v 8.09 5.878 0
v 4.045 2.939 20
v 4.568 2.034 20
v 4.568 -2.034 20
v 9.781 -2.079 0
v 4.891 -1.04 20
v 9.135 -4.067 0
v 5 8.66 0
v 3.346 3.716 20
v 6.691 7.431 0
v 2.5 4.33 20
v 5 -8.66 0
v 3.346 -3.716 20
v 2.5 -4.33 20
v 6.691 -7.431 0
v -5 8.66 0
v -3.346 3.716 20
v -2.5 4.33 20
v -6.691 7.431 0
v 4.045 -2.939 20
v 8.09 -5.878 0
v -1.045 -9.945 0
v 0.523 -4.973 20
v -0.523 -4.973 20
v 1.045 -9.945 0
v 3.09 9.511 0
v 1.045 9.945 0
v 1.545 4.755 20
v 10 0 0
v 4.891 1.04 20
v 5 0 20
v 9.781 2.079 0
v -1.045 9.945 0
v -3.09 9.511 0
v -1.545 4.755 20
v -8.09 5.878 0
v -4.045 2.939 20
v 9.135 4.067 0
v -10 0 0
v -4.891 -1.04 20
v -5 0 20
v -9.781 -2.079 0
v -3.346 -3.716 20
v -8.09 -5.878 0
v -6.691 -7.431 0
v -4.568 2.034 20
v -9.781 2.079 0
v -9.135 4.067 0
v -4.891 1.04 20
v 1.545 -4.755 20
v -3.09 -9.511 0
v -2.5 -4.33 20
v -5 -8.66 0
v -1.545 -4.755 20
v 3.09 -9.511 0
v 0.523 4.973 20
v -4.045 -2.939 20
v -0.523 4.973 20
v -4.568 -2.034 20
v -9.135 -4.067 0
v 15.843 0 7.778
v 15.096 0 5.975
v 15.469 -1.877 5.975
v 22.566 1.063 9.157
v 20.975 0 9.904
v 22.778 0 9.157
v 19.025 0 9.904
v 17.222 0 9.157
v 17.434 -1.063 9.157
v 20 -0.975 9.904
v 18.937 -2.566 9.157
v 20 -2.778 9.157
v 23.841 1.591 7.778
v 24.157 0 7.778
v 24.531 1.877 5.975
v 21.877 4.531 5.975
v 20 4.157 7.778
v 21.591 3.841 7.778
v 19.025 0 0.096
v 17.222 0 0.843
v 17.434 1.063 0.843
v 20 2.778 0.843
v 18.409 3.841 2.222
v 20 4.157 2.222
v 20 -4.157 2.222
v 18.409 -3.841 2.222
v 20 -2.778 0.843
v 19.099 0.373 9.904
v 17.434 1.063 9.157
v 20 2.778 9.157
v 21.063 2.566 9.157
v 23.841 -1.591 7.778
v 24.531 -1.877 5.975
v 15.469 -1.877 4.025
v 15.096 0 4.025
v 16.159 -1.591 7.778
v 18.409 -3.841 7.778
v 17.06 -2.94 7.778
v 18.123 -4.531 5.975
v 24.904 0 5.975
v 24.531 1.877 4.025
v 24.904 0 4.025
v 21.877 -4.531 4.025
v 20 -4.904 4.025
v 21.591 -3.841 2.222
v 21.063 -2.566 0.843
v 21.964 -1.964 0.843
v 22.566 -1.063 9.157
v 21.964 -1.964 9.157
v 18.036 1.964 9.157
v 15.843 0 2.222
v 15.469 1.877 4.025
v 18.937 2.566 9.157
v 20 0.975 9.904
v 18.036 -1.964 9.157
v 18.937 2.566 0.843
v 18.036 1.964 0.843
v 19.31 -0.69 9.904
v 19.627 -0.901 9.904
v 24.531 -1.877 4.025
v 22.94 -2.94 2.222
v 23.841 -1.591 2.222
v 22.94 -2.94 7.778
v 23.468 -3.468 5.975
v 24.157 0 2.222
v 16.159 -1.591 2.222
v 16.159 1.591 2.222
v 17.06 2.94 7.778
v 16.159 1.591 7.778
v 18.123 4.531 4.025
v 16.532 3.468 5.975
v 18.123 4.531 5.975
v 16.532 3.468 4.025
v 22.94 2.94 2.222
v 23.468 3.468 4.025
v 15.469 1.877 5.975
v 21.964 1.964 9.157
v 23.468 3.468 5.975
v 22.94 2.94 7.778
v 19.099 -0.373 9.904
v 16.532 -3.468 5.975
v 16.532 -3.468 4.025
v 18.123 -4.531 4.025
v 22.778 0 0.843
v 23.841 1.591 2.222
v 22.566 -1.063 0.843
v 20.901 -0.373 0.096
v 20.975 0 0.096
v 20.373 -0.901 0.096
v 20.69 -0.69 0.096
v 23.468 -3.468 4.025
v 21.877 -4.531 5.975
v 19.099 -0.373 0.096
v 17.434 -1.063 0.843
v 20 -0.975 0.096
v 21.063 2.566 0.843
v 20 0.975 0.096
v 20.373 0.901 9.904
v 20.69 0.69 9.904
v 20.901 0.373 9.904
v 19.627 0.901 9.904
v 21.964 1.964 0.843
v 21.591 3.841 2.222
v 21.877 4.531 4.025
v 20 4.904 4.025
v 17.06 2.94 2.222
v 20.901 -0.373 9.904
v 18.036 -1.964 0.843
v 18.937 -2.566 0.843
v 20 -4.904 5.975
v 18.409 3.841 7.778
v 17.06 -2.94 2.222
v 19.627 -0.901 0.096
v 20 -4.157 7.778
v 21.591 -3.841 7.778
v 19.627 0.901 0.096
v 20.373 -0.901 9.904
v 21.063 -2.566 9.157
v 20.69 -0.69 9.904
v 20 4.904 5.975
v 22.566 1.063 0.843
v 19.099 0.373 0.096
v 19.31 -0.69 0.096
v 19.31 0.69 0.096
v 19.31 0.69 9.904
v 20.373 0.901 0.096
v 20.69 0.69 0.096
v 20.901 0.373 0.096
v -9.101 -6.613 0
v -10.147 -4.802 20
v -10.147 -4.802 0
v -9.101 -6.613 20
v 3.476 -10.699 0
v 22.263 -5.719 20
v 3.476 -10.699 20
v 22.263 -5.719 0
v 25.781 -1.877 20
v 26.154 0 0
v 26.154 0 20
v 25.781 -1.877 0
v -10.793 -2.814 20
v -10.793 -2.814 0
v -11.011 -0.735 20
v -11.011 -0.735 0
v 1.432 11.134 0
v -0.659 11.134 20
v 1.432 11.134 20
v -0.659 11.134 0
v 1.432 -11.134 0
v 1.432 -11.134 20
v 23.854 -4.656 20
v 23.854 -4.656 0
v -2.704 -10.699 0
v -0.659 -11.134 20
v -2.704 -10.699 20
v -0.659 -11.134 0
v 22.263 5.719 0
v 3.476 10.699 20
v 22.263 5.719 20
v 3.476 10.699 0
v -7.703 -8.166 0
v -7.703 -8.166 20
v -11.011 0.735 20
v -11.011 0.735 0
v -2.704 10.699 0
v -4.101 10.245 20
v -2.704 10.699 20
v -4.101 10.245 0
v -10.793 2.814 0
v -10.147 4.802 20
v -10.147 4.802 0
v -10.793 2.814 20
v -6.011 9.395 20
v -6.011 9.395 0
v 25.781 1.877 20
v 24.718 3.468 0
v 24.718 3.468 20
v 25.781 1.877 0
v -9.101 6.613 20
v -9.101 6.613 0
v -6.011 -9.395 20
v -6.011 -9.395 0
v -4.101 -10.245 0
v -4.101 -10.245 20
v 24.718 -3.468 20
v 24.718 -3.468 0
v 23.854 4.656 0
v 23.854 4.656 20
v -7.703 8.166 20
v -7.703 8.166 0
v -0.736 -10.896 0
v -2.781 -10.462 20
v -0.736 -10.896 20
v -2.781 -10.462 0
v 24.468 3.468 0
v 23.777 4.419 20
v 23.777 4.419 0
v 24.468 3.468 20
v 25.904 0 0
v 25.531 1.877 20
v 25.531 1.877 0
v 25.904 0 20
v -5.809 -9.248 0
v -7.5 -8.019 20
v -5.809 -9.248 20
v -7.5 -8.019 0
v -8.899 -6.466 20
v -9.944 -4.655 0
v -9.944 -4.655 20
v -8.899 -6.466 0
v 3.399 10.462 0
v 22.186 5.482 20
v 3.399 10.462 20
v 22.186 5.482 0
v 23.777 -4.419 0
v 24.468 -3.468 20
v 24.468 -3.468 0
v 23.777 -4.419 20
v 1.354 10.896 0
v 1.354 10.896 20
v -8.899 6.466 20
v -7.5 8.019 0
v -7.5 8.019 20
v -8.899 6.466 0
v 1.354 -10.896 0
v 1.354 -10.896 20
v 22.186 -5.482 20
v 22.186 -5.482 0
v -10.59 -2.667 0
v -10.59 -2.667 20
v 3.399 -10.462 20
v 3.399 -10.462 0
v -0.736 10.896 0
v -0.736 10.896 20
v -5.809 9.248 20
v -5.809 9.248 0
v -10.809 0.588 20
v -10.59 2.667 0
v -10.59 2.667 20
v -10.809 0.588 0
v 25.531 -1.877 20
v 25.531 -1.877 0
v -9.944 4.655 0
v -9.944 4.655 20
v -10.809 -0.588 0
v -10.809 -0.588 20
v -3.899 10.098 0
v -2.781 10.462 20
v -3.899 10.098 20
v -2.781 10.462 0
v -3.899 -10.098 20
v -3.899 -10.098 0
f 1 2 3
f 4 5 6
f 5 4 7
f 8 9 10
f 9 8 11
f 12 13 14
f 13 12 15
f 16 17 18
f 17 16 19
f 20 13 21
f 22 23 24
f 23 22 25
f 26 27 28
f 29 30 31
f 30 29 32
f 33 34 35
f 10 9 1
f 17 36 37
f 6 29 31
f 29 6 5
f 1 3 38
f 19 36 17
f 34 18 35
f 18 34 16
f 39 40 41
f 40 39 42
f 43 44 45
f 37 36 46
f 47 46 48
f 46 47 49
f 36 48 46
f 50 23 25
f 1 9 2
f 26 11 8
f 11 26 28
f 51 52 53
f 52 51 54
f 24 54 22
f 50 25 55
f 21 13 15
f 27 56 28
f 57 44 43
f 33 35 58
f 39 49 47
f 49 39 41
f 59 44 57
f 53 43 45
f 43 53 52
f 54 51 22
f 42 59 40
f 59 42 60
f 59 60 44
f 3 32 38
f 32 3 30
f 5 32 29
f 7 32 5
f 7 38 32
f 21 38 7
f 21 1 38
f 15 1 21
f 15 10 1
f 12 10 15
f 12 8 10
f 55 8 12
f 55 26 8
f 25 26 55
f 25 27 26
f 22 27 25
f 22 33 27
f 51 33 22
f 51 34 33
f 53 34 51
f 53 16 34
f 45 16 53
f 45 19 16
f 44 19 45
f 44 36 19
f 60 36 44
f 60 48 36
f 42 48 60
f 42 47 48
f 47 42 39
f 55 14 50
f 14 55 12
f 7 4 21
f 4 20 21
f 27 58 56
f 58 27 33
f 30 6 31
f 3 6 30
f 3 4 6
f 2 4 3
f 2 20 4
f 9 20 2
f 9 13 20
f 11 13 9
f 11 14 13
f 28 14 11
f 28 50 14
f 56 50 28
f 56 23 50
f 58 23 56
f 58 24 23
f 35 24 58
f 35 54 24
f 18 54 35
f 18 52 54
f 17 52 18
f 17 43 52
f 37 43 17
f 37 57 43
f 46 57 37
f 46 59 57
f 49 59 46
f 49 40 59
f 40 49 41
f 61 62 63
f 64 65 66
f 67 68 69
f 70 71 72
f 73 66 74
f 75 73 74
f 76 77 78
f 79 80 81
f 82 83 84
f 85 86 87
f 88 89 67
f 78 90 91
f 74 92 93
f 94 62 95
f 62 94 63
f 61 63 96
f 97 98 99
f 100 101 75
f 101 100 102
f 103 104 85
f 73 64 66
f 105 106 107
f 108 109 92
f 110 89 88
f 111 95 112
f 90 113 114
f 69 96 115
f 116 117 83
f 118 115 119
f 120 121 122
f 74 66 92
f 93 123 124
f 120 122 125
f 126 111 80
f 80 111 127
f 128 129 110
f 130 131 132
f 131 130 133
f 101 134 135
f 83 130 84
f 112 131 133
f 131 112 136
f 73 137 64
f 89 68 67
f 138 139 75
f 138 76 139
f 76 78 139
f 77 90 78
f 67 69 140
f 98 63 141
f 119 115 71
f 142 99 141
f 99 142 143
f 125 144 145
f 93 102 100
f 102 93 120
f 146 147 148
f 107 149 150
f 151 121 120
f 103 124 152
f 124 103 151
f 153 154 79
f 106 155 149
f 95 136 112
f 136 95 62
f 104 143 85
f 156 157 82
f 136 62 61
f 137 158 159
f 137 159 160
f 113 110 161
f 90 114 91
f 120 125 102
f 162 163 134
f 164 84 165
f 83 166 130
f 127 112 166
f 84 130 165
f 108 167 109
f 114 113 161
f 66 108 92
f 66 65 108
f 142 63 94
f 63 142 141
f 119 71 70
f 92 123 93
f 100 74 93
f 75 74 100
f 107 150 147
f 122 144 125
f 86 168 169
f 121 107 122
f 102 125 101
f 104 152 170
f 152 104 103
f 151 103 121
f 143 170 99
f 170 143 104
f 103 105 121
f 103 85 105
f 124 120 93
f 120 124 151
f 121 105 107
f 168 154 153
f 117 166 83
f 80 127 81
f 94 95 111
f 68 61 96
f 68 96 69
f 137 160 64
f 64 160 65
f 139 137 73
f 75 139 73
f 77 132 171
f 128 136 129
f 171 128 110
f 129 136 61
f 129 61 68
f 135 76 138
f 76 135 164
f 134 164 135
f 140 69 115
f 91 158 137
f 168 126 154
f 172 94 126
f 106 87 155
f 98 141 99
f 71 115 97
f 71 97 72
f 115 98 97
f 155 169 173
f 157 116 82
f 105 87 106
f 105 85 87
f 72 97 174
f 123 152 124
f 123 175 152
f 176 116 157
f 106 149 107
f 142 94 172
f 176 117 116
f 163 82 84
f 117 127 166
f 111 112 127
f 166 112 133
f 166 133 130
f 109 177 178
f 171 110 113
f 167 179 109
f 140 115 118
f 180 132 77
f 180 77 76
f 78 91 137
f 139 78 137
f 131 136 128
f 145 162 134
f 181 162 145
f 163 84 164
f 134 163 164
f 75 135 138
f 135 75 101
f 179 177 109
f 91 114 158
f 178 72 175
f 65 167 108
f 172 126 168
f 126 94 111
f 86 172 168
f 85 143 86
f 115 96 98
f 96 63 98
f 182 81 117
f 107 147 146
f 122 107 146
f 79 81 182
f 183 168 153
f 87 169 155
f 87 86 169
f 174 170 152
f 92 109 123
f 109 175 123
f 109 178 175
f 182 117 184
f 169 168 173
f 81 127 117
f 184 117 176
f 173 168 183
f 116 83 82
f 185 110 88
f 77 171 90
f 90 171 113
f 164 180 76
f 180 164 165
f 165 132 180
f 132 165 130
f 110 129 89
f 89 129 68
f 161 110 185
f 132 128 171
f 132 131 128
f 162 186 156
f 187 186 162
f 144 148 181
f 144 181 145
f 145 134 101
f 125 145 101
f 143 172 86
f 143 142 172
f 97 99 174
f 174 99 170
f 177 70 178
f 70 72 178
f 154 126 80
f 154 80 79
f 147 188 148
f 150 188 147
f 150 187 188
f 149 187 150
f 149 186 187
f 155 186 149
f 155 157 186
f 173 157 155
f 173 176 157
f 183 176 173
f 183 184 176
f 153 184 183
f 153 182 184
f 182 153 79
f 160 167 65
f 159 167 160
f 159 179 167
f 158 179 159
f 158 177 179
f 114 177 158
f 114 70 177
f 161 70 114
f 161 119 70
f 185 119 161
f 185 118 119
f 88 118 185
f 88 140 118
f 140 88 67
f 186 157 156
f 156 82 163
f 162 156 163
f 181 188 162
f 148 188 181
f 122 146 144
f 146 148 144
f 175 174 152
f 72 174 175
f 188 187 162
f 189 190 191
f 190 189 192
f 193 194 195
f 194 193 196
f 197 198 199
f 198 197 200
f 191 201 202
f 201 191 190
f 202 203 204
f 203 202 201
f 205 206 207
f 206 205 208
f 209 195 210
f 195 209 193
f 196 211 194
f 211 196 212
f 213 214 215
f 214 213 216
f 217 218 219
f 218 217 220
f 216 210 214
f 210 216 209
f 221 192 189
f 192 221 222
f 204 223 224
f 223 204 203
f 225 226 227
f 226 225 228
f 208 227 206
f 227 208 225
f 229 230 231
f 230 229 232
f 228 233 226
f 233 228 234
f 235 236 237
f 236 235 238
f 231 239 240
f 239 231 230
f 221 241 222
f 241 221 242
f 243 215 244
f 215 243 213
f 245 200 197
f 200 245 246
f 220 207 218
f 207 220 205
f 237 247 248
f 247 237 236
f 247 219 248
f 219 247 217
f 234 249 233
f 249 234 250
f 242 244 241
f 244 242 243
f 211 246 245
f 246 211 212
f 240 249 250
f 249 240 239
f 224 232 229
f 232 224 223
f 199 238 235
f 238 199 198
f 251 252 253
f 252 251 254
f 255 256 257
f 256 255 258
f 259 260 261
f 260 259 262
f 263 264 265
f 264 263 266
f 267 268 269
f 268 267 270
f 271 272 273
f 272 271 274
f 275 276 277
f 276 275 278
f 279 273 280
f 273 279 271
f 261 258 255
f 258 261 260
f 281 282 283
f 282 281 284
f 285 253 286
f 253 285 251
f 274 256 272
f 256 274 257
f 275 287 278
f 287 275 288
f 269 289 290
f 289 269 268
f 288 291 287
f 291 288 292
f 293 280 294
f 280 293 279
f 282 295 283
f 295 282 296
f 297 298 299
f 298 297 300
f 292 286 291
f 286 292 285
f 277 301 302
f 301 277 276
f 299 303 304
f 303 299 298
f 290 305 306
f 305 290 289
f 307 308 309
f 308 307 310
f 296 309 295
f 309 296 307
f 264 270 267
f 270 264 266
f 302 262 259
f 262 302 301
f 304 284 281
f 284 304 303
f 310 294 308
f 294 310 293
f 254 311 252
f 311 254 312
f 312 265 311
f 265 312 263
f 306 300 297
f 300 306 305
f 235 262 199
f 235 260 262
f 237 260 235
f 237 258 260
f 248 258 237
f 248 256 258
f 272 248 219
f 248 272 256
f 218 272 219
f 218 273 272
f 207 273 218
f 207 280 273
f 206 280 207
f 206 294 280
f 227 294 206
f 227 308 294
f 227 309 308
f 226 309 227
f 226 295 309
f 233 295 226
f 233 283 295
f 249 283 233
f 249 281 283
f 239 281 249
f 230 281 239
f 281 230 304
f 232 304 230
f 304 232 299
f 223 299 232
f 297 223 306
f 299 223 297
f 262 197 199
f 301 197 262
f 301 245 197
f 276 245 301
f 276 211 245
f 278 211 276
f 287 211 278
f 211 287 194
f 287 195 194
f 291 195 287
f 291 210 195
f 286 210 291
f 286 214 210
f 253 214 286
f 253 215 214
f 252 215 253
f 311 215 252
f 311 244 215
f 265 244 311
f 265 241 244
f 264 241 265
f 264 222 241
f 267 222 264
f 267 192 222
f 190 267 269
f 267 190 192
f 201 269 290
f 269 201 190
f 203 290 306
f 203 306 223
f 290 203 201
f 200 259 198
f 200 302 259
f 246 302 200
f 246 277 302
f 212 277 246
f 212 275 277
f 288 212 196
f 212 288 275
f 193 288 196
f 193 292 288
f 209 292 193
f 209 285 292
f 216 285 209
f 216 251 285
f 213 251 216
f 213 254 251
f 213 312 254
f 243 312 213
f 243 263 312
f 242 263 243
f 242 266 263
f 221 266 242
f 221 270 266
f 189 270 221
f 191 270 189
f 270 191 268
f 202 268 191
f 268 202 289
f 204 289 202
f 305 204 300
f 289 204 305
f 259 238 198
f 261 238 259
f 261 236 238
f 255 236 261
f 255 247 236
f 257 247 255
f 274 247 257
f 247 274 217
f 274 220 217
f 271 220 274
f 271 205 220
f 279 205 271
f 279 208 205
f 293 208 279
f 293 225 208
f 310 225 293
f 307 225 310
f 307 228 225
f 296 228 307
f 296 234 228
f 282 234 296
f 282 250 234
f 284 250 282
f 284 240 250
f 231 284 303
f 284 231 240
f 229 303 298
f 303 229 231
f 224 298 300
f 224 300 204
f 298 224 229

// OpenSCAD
/*
 * WhateverSCAD by John Strunk is licensed under the Creative Commons
 * Attribution-ShareAlike 4.0 International License. To view a copy of
 * this license, visit http://creativecommons.org/licenses/by-sa/4.0/
 * or send a letter to Creative Commons, 444 Castro Street, Suite 900,
 * Mountain View, California, 94041, USA.
 */

/*****************************
 * containment(t, dist)
 * Produces a heat containment wall around the child object(s)
 * t: The thickness of the wall (e.g., the extrusion width)
 * dist: The distance from the object (default=2)
 ****************************/
module containment(t, dist = 2) {
	union() {
		intersection() {
			difference() {
				minkowski() { // create a tall tower
					cylinder(d=2+t, h=1);
					hull() {
						translate([0, 0, 1e6]) children();
						translate([0, 0, -1e6]) children();
					}
				}
				minkowski() { // cut out the inside
					cylinder(d=2, h=1);
					hull() {
						translate([0, 0, 1e6]) children();
						translate([0, 0, -1e6]) children();
					}
				}
			}
			hull() { // cut the wall to the final height
				translate([1e6, 1e6, 0]) children();
				translate([1e6, -1e6, 0]) children();
				translate([-1e6, 1e6, 0]) children();
				translate([-1e6, -1e6, 0]) children();
			}
		}
		children();
	}
}

module _testContainment() {
	containment(0.5) {
		cylinder(h=20, r1=10, r2=5);
		translate([20, 0, 5]) sphere(r=5);
	}
}

_testContainment();
